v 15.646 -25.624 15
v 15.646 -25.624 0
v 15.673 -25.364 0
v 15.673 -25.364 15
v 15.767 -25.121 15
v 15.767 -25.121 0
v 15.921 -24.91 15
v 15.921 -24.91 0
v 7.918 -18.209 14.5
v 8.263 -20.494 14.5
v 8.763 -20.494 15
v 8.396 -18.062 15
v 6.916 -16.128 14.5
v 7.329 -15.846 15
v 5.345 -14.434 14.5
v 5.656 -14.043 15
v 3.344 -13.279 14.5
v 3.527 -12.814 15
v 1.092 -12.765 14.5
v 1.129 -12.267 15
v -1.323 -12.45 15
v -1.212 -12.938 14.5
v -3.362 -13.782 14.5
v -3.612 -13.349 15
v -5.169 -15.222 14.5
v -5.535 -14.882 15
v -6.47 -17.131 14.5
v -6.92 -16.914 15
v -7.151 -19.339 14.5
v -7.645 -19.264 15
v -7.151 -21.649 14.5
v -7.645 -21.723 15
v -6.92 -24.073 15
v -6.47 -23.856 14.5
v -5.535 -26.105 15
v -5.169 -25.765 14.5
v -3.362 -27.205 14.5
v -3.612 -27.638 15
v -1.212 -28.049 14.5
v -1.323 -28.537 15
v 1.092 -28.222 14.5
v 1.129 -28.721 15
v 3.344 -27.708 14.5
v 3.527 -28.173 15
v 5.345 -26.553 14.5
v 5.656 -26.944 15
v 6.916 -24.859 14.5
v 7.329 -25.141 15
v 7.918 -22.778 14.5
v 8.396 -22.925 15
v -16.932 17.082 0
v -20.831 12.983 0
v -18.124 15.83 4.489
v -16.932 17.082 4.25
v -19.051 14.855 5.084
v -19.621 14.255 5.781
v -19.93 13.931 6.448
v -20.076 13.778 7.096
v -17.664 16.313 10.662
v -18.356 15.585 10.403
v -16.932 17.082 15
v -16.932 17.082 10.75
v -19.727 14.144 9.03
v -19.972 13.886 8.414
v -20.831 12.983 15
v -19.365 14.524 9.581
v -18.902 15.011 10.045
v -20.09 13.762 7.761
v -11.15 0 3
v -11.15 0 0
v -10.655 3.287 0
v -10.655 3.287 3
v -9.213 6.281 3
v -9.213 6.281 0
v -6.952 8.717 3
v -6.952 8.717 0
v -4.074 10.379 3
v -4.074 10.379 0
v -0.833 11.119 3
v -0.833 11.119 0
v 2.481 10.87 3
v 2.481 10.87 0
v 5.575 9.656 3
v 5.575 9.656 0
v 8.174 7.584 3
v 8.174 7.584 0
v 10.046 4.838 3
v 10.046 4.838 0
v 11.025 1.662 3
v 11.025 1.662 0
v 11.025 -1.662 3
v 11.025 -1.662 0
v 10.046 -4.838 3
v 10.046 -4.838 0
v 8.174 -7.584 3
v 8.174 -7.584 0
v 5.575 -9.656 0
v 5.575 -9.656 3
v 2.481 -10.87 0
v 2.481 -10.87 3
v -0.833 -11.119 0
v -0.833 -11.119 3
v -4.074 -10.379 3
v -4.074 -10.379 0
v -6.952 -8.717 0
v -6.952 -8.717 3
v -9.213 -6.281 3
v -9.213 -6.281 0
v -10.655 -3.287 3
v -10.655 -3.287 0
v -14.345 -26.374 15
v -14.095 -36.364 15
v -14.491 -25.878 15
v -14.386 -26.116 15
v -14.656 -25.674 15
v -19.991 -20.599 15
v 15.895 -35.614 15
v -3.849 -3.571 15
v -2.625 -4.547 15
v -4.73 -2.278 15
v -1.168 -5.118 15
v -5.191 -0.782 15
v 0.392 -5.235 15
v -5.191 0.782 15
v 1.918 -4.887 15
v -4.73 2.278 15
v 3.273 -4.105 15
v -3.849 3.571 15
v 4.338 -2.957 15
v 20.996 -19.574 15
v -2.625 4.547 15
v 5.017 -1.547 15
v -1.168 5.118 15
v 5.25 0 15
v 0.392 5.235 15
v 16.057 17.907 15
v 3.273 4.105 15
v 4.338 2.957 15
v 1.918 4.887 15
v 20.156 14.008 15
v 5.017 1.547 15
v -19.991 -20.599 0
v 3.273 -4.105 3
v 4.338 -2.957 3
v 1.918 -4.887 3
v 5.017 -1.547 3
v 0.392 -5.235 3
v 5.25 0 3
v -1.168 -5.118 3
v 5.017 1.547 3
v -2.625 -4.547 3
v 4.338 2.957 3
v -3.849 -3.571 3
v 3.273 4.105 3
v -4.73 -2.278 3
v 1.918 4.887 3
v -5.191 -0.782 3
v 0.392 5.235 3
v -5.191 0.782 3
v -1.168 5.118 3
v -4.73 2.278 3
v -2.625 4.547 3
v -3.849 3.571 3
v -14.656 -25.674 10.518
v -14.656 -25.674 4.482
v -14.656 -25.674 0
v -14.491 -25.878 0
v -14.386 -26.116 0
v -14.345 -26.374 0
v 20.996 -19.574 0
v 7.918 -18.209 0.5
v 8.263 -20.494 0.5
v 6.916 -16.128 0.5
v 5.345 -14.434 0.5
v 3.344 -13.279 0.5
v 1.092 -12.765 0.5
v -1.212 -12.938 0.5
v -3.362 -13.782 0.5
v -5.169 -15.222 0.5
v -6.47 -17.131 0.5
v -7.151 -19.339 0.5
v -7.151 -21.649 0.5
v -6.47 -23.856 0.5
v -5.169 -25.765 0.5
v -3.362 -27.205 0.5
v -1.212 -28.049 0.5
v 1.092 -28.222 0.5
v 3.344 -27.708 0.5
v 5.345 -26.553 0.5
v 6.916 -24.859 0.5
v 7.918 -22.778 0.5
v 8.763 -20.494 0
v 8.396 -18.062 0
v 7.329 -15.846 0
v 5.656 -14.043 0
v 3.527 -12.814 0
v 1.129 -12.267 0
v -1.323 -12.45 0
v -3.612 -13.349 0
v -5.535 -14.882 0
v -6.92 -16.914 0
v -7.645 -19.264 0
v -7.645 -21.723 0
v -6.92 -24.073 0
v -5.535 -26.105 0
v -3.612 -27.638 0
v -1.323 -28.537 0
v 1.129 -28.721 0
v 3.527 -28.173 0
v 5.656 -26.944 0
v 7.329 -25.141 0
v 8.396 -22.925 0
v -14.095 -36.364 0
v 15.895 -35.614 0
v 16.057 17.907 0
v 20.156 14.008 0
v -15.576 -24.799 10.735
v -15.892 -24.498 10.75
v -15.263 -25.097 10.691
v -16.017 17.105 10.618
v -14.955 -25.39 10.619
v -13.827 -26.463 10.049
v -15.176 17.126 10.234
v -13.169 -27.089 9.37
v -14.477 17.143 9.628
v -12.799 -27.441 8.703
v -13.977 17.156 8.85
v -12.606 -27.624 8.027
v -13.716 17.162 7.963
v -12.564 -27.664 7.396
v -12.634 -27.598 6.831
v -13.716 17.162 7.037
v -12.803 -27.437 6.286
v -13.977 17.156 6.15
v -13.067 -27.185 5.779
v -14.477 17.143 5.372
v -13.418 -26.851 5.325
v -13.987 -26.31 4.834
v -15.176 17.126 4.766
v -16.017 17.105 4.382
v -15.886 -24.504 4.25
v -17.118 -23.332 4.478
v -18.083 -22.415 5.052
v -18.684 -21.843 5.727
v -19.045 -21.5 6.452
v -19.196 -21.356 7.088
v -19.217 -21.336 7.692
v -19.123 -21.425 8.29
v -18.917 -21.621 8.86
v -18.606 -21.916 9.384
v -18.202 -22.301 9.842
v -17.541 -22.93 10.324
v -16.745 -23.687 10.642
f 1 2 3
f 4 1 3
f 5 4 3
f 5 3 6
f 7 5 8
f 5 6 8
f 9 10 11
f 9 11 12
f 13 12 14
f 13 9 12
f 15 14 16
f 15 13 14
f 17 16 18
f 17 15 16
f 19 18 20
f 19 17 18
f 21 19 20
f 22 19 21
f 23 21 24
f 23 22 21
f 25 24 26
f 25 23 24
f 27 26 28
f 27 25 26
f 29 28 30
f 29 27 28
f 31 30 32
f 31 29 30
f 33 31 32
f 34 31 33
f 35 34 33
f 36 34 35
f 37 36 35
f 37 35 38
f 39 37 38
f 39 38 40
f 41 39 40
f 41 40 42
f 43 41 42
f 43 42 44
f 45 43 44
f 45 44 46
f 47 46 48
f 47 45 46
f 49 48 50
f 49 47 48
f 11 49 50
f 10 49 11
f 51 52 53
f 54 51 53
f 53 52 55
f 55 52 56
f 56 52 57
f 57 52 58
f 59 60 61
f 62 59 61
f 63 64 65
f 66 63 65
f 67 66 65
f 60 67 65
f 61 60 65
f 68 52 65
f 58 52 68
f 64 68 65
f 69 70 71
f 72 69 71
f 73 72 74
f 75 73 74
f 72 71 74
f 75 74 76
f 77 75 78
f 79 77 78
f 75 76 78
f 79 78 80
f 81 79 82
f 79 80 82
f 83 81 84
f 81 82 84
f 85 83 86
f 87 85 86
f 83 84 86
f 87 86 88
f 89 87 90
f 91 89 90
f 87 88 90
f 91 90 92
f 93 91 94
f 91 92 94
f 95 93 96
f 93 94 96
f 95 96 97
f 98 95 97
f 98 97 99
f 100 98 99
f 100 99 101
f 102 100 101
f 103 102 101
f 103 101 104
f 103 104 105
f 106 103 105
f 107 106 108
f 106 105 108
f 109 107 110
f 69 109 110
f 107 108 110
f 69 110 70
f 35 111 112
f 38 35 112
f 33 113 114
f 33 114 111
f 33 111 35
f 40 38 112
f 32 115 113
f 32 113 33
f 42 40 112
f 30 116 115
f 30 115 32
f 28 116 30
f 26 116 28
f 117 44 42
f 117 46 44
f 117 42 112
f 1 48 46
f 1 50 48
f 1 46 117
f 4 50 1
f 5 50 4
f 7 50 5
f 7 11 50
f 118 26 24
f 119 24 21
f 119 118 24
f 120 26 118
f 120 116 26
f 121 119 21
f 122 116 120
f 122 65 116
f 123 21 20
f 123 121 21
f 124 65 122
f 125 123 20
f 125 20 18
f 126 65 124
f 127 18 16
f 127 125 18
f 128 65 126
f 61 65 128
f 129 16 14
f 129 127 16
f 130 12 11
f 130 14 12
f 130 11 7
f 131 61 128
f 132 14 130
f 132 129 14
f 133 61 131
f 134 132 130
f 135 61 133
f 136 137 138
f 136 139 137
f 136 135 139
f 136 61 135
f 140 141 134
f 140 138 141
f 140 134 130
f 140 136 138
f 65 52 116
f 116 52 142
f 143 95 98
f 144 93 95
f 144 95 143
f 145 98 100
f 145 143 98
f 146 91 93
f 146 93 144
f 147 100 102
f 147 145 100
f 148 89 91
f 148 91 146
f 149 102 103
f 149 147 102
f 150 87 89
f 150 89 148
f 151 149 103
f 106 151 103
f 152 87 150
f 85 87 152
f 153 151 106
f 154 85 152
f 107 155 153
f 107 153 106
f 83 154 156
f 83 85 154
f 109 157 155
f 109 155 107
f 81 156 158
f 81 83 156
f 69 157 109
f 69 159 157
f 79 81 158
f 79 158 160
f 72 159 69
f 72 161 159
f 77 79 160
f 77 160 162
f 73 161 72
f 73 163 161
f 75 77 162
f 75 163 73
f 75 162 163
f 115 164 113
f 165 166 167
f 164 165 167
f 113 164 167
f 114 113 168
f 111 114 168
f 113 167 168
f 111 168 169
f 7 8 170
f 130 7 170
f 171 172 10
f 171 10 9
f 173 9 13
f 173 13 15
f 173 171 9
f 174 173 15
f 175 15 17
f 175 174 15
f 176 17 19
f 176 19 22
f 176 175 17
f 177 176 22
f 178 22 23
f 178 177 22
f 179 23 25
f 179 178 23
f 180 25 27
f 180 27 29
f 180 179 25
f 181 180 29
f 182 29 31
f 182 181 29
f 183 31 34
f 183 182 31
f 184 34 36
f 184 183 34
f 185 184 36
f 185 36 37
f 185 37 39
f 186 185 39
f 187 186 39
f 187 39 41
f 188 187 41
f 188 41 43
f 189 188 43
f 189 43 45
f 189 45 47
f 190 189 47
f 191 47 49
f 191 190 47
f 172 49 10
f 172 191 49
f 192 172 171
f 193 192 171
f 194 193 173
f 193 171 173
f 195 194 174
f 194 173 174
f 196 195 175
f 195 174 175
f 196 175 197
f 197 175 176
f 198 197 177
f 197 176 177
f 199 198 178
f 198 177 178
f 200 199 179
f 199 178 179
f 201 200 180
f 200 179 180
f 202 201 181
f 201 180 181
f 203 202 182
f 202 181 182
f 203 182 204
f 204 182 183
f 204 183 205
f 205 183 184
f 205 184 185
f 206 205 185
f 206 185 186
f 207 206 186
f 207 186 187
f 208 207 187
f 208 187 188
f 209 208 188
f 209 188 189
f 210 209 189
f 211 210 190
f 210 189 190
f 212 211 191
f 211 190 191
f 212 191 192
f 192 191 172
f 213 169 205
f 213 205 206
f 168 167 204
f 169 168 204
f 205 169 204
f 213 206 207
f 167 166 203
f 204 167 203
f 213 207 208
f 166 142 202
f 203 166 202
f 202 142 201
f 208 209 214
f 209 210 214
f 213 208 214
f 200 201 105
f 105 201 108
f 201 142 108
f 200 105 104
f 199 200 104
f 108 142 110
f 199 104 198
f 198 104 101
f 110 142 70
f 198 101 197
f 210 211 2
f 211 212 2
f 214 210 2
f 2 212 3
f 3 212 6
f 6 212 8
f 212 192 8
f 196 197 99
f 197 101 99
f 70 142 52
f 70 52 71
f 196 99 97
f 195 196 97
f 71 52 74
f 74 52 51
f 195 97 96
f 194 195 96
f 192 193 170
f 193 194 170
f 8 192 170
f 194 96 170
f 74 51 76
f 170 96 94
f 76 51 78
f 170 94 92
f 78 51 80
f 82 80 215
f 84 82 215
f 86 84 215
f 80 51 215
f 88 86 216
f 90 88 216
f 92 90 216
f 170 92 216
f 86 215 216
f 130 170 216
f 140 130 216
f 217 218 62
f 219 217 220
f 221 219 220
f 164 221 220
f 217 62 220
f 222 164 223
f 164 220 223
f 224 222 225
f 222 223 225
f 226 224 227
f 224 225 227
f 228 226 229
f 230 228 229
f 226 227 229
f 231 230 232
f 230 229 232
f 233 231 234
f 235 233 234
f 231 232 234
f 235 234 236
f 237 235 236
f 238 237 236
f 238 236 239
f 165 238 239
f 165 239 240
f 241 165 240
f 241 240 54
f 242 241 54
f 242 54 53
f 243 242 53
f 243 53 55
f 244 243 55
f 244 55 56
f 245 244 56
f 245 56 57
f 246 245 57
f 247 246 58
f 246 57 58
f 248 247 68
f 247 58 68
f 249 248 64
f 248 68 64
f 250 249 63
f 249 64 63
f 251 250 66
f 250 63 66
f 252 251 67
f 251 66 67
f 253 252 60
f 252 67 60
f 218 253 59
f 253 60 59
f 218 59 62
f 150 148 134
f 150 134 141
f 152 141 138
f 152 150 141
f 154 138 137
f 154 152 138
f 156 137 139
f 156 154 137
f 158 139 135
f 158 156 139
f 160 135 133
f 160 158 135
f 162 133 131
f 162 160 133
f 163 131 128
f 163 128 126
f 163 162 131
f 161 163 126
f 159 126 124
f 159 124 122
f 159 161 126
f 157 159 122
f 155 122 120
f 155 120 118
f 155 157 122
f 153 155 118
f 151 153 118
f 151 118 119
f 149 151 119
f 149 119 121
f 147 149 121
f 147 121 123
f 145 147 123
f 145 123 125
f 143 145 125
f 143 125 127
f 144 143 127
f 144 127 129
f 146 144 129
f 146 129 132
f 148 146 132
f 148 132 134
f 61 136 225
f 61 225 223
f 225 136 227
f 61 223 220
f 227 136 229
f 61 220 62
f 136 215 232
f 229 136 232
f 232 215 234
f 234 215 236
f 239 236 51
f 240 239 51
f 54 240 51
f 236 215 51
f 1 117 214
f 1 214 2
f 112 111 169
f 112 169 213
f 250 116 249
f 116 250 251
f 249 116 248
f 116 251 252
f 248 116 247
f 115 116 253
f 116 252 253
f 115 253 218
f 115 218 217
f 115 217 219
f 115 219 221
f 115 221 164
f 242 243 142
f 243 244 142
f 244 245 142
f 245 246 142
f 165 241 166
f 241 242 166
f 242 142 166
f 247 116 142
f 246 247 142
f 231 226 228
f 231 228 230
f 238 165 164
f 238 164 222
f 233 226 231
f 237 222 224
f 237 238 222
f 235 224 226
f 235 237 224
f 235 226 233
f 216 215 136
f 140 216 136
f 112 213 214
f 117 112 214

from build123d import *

# Parameters (mm, degrees)
SKETCH1_R           = 5.25
SKETCH1_R_2         = 7.75
BOSS_EXTRUDE2_DEPTH = 15
SKETCH3_R           = 11.15
CUT_EXTRUDE2_DEPTH  = 3
CHAMFER1_SIZE       = 4
CHAMFER2_SIZE       = 0.5
CUT_EXTRUDE3_REACH  = 61.876
SKETCH4_R           = 3.25


with BuildPart() as part:
    # Sketch1 → Boss-Extrude2 (new body)
    with BuildSketch(Plane.XY):
        with BuildLine():
            Line((20.995969439, -19.574054899), (20.05604274, 18.007086094))
            Line((20.05604274, 18.007086094), (-20.93113991, 16.981972267))
            Line((-20.93113991, 16.981972267), (-19.991213211, -20.599168727))
            Line((-19.991213211, -20.599168727), (-14.655542141, -25.674455545))
            ThreePointArc((-14.655542141, -25.674455545), (-14.430725672, -25.993357553), (-14.345060853, -26.374018128))
            Line((-14.345060853, -26.374018128), (-14.09521078, -36.363787386))
            Line((-14.09521078, -36.363787386), (15.895410672, -35.613704098))
            Line((15.895410672, -35.613704098), (15.645560598, -25.62393484))
            ThreePointArc((15.645560598, -25.62393484), (15.712089121, -25.239467818), (15.920682621, -24.90972597))
            Line((15.920682621, -24.90972597), (20.995969439, -19.574054899))
        make_face()
        Circle(SKETCH1_R, mode=Mode.SUBTRACT)
        with Locations((0.512556914, -20.493591325)):
            Circle(SKETCH1_R_2, mode=Mode.SUBTRACT)
    extrude(amount=BOSS_EXTRUDE2_DEPTH)

    # Sketch3 → Cut-Extrude2 (cut)
    with BuildSketch(Plane(origin=(0, 0, 0), x_dir=(-1, 0, 0), z_dir=(0, 0, -1))):
        Circle(SKETCH3_R)
    extrude(amount=-CUT_EXTRUDE2_DEPTH, mode=Mode.SUBTRACT)

    # Chamfer1
    chamfer1_edges = [part.edges().sort_by_distance(p)[0] for p in [
        (-20.93113991, 16.981972267, 7.5),
        (20.05604274, 18.007086094, 7.5),
    ]]
    chamfer(chamfer1_edges, length=CHAMFER1_SIZE)

    # Chamfer2
    chamfer2_edges = [part.edges().sort_by_distance(p)[0] for p in [
        (-7.237443086, -20.493591325, 0),
        (-7.237443086, -20.493591325, 15),
    ]]
    chamfer(chamfer2_edges, length=CHAMFER2_SIZE)

    # Cut-Extrude3: up to this plane
    cut_extrude3_end = Plane(origin=(-14.655542141, -25.674455545, 15), z_dir=(0.6892060940298353, 0.7245653593376775, 0))
    # Sketch4 → Cut-Extrude3 (cut, up to the surface)
    with BuildSketch(Plane(origin=(-0.437548585, 17.49452918, 0), x_dir=(0.9996873817241273, 0.02500277627702985, 0), z_dir=(-0.02500277627702985, 0.9996873817241273, 0)), mode=Mode.PRIVATE) as cut_extrude3_sk1:
        with Locations(Location((-16.5, -7.5, 0), (0, 0, 270))):
            Circle(SKETCH4_R)
    cut_extrude3_tool1 = split(extrude(cut_extrude3_sk1.sketch, amount=-CUT_EXTRUDE3_REACH, mode=Mode.PRIVATE), bisect_by=cut_extrude3_end, keep=Keep.BOTH, mode=Mode.PRIVATE)
    add(cut_extrude3_tool1.solids().sort_by_distance((-16.93239, 17.081983, 7.5))[0], mode=Mode.SUBTRACT)


solid = part.part
